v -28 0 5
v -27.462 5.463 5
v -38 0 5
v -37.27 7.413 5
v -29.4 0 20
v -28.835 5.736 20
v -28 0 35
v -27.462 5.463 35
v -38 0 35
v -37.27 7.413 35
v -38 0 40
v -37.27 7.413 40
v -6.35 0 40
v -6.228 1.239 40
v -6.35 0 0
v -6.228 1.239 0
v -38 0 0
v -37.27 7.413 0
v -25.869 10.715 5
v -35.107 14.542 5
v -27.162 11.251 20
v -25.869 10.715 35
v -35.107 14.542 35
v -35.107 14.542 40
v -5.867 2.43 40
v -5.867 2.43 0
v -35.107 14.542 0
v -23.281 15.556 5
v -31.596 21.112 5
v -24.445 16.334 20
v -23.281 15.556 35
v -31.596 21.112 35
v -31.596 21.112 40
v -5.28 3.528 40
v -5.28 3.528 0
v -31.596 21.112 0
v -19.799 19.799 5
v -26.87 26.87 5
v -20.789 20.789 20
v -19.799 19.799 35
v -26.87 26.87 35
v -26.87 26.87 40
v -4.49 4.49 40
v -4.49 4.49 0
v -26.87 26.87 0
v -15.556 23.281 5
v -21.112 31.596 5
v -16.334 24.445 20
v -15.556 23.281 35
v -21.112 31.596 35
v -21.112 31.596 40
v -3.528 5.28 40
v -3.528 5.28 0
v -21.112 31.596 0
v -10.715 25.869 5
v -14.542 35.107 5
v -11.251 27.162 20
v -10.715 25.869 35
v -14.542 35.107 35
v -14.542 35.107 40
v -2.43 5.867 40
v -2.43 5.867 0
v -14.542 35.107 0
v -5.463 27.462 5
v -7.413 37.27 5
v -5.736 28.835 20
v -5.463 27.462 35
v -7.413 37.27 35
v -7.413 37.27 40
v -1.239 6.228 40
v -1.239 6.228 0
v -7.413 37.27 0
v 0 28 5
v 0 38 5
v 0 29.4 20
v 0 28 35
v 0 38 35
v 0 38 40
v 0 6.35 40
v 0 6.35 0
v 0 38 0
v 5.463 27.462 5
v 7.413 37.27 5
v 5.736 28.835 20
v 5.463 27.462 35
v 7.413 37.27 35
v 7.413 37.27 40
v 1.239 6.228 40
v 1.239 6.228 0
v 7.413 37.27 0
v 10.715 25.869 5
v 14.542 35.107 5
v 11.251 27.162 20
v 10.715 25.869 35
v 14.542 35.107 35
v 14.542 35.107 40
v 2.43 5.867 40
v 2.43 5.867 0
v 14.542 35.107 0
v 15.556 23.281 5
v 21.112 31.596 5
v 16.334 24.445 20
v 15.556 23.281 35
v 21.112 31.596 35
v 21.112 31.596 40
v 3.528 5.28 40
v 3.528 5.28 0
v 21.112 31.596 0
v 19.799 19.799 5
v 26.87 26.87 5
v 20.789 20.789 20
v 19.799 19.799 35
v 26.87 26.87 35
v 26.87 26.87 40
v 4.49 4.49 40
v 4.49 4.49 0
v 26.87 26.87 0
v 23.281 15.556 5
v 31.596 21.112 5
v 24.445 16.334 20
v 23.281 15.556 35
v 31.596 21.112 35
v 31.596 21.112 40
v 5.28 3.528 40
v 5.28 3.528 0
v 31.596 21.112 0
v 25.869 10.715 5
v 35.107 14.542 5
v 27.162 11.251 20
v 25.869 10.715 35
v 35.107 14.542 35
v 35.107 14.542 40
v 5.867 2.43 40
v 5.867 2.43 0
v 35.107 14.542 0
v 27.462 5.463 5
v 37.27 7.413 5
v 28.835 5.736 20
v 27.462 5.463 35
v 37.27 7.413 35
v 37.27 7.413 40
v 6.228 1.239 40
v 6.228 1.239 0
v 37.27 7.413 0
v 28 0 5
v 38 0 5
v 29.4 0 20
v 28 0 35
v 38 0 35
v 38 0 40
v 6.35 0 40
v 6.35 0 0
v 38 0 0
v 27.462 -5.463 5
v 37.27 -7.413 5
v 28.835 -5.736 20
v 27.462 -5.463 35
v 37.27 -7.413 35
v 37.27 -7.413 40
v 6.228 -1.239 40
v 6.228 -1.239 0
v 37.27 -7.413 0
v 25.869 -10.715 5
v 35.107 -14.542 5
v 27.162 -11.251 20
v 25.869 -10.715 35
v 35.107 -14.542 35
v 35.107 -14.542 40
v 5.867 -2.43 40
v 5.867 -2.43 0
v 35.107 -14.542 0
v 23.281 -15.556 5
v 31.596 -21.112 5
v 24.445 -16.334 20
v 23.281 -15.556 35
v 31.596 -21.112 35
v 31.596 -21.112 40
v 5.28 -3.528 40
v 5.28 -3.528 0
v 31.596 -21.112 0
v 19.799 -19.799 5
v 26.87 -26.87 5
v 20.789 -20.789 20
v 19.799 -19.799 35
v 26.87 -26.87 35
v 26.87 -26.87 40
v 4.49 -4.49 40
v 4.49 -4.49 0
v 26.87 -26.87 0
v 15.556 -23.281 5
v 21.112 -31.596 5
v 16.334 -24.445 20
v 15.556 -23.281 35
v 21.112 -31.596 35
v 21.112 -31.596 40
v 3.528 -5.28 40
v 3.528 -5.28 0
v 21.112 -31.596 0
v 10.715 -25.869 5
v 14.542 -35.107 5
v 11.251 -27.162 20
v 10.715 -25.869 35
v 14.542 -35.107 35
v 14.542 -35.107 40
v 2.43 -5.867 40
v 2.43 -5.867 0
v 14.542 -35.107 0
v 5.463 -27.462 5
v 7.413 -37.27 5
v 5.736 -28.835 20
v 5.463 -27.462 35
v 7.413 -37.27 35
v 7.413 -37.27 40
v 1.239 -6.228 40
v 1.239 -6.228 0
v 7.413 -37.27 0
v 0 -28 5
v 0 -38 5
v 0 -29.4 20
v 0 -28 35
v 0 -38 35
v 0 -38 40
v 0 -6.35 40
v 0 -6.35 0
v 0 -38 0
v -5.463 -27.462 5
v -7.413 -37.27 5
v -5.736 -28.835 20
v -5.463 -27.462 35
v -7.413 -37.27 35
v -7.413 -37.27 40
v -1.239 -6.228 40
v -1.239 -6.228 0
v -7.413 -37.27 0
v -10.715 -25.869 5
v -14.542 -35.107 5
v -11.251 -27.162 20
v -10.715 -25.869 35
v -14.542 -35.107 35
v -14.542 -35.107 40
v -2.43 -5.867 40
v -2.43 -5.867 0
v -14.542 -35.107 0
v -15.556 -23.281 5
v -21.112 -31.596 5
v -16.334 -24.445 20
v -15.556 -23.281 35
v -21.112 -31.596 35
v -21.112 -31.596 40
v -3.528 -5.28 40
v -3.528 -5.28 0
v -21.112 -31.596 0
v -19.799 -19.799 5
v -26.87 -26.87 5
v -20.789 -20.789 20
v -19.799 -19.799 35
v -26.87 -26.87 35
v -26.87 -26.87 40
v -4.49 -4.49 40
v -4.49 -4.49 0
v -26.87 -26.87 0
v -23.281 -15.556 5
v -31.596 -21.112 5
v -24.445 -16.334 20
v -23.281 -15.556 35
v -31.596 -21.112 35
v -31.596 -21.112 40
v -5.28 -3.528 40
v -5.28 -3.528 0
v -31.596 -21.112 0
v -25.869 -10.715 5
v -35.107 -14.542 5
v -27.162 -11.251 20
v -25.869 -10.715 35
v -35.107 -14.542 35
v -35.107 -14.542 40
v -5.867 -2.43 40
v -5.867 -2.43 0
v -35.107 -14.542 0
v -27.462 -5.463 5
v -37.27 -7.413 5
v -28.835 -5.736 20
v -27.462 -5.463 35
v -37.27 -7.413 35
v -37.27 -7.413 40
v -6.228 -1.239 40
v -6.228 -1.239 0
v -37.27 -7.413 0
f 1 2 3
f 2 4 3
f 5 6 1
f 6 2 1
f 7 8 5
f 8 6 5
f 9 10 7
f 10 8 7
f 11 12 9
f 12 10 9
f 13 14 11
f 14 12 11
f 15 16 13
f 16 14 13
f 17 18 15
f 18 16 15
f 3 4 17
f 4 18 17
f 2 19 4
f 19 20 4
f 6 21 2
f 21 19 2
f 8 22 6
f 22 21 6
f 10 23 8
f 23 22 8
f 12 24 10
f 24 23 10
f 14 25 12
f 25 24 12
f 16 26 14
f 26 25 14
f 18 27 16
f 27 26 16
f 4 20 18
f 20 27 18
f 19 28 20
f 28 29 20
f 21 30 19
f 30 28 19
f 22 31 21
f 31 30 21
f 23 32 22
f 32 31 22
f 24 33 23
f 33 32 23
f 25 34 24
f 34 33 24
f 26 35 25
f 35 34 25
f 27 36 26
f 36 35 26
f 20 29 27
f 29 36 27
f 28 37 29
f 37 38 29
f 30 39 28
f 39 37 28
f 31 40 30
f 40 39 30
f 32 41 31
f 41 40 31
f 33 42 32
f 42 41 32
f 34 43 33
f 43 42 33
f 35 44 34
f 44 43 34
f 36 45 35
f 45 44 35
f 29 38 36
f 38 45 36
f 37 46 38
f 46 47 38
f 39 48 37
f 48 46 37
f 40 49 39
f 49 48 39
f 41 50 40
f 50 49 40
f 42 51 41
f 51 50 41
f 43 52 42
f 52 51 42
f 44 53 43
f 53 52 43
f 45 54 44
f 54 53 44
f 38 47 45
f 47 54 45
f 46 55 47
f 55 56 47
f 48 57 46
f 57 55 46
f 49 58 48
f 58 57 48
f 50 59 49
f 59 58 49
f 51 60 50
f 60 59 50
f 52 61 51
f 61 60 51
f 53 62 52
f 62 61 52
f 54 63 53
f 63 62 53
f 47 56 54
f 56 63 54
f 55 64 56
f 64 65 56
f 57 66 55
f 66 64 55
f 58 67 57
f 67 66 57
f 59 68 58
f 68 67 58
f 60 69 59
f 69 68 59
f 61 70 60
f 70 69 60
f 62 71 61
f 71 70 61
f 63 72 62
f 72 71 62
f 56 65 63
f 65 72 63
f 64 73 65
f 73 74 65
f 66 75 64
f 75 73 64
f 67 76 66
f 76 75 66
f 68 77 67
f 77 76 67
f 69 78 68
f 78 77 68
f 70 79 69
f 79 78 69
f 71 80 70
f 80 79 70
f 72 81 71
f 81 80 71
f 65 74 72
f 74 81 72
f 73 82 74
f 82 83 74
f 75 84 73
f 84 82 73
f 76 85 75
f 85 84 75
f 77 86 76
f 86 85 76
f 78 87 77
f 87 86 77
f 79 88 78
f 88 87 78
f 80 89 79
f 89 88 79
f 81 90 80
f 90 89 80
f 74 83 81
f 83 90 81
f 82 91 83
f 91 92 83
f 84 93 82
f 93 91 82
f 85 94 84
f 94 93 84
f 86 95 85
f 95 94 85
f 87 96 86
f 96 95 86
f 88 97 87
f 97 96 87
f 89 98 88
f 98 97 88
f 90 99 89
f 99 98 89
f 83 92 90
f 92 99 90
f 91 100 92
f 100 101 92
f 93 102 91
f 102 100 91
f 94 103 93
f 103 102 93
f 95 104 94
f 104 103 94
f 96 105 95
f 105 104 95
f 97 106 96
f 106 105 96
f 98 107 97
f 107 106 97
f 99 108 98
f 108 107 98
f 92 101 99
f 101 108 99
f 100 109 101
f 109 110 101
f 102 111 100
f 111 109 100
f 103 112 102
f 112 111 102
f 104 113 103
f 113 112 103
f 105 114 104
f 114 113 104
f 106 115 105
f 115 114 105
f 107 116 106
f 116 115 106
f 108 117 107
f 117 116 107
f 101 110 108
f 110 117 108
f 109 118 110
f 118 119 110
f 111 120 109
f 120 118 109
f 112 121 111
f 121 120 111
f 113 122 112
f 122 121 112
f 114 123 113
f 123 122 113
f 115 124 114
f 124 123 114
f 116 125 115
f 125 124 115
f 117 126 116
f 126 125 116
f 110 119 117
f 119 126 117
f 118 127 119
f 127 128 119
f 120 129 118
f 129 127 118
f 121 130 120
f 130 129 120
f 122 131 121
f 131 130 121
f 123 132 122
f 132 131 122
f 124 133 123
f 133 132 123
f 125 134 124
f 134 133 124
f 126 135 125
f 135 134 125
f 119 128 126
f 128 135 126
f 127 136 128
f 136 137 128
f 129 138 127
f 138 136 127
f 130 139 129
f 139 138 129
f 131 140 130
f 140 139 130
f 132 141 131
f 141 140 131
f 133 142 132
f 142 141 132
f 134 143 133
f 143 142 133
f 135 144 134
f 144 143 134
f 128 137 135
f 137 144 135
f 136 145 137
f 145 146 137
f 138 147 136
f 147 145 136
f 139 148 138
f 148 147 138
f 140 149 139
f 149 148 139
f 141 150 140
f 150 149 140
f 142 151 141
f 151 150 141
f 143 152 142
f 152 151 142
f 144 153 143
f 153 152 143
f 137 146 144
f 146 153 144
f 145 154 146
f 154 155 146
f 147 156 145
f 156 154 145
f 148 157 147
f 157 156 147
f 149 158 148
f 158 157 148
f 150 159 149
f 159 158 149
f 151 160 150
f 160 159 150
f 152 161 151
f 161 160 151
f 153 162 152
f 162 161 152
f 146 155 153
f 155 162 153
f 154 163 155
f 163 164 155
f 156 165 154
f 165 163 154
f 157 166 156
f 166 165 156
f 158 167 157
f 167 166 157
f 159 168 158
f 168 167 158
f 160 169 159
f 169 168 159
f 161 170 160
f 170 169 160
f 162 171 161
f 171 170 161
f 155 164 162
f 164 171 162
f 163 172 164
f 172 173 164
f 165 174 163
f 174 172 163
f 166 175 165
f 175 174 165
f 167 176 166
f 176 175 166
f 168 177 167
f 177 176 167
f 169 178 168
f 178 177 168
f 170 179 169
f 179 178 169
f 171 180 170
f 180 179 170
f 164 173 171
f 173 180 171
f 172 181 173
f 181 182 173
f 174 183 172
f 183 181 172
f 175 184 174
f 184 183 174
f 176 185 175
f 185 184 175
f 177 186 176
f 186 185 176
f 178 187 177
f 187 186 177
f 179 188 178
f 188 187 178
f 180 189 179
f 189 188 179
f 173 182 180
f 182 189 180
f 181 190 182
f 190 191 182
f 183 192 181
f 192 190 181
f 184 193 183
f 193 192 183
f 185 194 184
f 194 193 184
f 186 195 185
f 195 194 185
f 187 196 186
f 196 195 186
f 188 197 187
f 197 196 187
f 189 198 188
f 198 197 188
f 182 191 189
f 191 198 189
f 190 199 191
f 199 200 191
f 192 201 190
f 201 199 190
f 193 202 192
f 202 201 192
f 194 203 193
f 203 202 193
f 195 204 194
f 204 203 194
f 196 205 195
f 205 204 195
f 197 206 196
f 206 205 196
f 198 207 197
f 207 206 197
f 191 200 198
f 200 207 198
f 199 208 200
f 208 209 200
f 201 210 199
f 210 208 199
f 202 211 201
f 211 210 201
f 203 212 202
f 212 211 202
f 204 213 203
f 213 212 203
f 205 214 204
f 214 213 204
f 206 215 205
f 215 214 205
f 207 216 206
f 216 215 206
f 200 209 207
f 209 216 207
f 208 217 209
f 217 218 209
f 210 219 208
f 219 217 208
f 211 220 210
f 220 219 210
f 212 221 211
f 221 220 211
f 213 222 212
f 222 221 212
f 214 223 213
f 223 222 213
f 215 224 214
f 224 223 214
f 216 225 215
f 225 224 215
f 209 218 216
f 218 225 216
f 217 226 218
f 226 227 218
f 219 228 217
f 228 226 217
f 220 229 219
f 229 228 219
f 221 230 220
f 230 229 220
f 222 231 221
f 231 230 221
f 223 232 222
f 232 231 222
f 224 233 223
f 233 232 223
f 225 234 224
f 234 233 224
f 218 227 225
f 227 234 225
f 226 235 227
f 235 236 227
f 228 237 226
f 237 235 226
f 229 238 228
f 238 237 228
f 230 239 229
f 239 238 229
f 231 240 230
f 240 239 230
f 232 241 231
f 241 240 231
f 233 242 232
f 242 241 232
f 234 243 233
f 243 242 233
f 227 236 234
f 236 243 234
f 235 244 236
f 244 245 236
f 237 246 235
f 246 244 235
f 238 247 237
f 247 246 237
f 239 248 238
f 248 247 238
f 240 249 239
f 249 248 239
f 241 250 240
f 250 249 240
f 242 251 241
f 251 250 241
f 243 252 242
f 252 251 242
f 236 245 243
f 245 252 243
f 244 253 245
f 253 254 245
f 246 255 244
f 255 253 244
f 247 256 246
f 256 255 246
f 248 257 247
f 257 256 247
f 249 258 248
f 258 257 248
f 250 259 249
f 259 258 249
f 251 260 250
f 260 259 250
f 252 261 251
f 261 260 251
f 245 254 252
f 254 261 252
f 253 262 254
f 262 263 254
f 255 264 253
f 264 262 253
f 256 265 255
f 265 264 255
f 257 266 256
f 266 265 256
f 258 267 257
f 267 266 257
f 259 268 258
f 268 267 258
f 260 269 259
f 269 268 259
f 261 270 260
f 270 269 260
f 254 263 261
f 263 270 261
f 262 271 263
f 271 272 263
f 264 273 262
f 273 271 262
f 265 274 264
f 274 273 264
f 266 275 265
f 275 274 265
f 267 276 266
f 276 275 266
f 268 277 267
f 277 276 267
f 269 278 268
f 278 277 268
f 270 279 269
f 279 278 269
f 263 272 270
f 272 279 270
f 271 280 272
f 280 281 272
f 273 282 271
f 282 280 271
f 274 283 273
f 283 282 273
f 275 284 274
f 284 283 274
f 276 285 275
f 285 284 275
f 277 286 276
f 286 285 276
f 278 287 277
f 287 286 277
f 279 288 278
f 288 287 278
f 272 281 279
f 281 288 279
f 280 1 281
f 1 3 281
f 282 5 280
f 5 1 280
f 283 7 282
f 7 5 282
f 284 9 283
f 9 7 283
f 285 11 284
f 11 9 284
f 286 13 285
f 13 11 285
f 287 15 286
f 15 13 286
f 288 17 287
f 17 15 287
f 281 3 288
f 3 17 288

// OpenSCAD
$fn = 32;

// ----------------------------------------------------------------------
// Belt roller: 56 mm barrel, 40 mm wide, bore 12.7 mm
// ----------------------------------------------------------------------

// --- parameters (mm) ---
bore_d = 12.7;            // bore
barrel_d = 56;            // barrel diameter
roller_w = 40;            // roller width
flange_d = 76;            // flange diameter
flange_t = 5;             // flange thickness
hub_d = 32.7;             // hub diameter

roller_profile = [[6.35, 0], [38, 0], [38, 5], [28, 5], [29.4, 20], [28, 35], [38, 35], [38, 40], [6.35, 40]];

/* the profile stays clear of the axis, so the bore comes out of the revolve */
rotate_extrude() polygon(roller_profile);
